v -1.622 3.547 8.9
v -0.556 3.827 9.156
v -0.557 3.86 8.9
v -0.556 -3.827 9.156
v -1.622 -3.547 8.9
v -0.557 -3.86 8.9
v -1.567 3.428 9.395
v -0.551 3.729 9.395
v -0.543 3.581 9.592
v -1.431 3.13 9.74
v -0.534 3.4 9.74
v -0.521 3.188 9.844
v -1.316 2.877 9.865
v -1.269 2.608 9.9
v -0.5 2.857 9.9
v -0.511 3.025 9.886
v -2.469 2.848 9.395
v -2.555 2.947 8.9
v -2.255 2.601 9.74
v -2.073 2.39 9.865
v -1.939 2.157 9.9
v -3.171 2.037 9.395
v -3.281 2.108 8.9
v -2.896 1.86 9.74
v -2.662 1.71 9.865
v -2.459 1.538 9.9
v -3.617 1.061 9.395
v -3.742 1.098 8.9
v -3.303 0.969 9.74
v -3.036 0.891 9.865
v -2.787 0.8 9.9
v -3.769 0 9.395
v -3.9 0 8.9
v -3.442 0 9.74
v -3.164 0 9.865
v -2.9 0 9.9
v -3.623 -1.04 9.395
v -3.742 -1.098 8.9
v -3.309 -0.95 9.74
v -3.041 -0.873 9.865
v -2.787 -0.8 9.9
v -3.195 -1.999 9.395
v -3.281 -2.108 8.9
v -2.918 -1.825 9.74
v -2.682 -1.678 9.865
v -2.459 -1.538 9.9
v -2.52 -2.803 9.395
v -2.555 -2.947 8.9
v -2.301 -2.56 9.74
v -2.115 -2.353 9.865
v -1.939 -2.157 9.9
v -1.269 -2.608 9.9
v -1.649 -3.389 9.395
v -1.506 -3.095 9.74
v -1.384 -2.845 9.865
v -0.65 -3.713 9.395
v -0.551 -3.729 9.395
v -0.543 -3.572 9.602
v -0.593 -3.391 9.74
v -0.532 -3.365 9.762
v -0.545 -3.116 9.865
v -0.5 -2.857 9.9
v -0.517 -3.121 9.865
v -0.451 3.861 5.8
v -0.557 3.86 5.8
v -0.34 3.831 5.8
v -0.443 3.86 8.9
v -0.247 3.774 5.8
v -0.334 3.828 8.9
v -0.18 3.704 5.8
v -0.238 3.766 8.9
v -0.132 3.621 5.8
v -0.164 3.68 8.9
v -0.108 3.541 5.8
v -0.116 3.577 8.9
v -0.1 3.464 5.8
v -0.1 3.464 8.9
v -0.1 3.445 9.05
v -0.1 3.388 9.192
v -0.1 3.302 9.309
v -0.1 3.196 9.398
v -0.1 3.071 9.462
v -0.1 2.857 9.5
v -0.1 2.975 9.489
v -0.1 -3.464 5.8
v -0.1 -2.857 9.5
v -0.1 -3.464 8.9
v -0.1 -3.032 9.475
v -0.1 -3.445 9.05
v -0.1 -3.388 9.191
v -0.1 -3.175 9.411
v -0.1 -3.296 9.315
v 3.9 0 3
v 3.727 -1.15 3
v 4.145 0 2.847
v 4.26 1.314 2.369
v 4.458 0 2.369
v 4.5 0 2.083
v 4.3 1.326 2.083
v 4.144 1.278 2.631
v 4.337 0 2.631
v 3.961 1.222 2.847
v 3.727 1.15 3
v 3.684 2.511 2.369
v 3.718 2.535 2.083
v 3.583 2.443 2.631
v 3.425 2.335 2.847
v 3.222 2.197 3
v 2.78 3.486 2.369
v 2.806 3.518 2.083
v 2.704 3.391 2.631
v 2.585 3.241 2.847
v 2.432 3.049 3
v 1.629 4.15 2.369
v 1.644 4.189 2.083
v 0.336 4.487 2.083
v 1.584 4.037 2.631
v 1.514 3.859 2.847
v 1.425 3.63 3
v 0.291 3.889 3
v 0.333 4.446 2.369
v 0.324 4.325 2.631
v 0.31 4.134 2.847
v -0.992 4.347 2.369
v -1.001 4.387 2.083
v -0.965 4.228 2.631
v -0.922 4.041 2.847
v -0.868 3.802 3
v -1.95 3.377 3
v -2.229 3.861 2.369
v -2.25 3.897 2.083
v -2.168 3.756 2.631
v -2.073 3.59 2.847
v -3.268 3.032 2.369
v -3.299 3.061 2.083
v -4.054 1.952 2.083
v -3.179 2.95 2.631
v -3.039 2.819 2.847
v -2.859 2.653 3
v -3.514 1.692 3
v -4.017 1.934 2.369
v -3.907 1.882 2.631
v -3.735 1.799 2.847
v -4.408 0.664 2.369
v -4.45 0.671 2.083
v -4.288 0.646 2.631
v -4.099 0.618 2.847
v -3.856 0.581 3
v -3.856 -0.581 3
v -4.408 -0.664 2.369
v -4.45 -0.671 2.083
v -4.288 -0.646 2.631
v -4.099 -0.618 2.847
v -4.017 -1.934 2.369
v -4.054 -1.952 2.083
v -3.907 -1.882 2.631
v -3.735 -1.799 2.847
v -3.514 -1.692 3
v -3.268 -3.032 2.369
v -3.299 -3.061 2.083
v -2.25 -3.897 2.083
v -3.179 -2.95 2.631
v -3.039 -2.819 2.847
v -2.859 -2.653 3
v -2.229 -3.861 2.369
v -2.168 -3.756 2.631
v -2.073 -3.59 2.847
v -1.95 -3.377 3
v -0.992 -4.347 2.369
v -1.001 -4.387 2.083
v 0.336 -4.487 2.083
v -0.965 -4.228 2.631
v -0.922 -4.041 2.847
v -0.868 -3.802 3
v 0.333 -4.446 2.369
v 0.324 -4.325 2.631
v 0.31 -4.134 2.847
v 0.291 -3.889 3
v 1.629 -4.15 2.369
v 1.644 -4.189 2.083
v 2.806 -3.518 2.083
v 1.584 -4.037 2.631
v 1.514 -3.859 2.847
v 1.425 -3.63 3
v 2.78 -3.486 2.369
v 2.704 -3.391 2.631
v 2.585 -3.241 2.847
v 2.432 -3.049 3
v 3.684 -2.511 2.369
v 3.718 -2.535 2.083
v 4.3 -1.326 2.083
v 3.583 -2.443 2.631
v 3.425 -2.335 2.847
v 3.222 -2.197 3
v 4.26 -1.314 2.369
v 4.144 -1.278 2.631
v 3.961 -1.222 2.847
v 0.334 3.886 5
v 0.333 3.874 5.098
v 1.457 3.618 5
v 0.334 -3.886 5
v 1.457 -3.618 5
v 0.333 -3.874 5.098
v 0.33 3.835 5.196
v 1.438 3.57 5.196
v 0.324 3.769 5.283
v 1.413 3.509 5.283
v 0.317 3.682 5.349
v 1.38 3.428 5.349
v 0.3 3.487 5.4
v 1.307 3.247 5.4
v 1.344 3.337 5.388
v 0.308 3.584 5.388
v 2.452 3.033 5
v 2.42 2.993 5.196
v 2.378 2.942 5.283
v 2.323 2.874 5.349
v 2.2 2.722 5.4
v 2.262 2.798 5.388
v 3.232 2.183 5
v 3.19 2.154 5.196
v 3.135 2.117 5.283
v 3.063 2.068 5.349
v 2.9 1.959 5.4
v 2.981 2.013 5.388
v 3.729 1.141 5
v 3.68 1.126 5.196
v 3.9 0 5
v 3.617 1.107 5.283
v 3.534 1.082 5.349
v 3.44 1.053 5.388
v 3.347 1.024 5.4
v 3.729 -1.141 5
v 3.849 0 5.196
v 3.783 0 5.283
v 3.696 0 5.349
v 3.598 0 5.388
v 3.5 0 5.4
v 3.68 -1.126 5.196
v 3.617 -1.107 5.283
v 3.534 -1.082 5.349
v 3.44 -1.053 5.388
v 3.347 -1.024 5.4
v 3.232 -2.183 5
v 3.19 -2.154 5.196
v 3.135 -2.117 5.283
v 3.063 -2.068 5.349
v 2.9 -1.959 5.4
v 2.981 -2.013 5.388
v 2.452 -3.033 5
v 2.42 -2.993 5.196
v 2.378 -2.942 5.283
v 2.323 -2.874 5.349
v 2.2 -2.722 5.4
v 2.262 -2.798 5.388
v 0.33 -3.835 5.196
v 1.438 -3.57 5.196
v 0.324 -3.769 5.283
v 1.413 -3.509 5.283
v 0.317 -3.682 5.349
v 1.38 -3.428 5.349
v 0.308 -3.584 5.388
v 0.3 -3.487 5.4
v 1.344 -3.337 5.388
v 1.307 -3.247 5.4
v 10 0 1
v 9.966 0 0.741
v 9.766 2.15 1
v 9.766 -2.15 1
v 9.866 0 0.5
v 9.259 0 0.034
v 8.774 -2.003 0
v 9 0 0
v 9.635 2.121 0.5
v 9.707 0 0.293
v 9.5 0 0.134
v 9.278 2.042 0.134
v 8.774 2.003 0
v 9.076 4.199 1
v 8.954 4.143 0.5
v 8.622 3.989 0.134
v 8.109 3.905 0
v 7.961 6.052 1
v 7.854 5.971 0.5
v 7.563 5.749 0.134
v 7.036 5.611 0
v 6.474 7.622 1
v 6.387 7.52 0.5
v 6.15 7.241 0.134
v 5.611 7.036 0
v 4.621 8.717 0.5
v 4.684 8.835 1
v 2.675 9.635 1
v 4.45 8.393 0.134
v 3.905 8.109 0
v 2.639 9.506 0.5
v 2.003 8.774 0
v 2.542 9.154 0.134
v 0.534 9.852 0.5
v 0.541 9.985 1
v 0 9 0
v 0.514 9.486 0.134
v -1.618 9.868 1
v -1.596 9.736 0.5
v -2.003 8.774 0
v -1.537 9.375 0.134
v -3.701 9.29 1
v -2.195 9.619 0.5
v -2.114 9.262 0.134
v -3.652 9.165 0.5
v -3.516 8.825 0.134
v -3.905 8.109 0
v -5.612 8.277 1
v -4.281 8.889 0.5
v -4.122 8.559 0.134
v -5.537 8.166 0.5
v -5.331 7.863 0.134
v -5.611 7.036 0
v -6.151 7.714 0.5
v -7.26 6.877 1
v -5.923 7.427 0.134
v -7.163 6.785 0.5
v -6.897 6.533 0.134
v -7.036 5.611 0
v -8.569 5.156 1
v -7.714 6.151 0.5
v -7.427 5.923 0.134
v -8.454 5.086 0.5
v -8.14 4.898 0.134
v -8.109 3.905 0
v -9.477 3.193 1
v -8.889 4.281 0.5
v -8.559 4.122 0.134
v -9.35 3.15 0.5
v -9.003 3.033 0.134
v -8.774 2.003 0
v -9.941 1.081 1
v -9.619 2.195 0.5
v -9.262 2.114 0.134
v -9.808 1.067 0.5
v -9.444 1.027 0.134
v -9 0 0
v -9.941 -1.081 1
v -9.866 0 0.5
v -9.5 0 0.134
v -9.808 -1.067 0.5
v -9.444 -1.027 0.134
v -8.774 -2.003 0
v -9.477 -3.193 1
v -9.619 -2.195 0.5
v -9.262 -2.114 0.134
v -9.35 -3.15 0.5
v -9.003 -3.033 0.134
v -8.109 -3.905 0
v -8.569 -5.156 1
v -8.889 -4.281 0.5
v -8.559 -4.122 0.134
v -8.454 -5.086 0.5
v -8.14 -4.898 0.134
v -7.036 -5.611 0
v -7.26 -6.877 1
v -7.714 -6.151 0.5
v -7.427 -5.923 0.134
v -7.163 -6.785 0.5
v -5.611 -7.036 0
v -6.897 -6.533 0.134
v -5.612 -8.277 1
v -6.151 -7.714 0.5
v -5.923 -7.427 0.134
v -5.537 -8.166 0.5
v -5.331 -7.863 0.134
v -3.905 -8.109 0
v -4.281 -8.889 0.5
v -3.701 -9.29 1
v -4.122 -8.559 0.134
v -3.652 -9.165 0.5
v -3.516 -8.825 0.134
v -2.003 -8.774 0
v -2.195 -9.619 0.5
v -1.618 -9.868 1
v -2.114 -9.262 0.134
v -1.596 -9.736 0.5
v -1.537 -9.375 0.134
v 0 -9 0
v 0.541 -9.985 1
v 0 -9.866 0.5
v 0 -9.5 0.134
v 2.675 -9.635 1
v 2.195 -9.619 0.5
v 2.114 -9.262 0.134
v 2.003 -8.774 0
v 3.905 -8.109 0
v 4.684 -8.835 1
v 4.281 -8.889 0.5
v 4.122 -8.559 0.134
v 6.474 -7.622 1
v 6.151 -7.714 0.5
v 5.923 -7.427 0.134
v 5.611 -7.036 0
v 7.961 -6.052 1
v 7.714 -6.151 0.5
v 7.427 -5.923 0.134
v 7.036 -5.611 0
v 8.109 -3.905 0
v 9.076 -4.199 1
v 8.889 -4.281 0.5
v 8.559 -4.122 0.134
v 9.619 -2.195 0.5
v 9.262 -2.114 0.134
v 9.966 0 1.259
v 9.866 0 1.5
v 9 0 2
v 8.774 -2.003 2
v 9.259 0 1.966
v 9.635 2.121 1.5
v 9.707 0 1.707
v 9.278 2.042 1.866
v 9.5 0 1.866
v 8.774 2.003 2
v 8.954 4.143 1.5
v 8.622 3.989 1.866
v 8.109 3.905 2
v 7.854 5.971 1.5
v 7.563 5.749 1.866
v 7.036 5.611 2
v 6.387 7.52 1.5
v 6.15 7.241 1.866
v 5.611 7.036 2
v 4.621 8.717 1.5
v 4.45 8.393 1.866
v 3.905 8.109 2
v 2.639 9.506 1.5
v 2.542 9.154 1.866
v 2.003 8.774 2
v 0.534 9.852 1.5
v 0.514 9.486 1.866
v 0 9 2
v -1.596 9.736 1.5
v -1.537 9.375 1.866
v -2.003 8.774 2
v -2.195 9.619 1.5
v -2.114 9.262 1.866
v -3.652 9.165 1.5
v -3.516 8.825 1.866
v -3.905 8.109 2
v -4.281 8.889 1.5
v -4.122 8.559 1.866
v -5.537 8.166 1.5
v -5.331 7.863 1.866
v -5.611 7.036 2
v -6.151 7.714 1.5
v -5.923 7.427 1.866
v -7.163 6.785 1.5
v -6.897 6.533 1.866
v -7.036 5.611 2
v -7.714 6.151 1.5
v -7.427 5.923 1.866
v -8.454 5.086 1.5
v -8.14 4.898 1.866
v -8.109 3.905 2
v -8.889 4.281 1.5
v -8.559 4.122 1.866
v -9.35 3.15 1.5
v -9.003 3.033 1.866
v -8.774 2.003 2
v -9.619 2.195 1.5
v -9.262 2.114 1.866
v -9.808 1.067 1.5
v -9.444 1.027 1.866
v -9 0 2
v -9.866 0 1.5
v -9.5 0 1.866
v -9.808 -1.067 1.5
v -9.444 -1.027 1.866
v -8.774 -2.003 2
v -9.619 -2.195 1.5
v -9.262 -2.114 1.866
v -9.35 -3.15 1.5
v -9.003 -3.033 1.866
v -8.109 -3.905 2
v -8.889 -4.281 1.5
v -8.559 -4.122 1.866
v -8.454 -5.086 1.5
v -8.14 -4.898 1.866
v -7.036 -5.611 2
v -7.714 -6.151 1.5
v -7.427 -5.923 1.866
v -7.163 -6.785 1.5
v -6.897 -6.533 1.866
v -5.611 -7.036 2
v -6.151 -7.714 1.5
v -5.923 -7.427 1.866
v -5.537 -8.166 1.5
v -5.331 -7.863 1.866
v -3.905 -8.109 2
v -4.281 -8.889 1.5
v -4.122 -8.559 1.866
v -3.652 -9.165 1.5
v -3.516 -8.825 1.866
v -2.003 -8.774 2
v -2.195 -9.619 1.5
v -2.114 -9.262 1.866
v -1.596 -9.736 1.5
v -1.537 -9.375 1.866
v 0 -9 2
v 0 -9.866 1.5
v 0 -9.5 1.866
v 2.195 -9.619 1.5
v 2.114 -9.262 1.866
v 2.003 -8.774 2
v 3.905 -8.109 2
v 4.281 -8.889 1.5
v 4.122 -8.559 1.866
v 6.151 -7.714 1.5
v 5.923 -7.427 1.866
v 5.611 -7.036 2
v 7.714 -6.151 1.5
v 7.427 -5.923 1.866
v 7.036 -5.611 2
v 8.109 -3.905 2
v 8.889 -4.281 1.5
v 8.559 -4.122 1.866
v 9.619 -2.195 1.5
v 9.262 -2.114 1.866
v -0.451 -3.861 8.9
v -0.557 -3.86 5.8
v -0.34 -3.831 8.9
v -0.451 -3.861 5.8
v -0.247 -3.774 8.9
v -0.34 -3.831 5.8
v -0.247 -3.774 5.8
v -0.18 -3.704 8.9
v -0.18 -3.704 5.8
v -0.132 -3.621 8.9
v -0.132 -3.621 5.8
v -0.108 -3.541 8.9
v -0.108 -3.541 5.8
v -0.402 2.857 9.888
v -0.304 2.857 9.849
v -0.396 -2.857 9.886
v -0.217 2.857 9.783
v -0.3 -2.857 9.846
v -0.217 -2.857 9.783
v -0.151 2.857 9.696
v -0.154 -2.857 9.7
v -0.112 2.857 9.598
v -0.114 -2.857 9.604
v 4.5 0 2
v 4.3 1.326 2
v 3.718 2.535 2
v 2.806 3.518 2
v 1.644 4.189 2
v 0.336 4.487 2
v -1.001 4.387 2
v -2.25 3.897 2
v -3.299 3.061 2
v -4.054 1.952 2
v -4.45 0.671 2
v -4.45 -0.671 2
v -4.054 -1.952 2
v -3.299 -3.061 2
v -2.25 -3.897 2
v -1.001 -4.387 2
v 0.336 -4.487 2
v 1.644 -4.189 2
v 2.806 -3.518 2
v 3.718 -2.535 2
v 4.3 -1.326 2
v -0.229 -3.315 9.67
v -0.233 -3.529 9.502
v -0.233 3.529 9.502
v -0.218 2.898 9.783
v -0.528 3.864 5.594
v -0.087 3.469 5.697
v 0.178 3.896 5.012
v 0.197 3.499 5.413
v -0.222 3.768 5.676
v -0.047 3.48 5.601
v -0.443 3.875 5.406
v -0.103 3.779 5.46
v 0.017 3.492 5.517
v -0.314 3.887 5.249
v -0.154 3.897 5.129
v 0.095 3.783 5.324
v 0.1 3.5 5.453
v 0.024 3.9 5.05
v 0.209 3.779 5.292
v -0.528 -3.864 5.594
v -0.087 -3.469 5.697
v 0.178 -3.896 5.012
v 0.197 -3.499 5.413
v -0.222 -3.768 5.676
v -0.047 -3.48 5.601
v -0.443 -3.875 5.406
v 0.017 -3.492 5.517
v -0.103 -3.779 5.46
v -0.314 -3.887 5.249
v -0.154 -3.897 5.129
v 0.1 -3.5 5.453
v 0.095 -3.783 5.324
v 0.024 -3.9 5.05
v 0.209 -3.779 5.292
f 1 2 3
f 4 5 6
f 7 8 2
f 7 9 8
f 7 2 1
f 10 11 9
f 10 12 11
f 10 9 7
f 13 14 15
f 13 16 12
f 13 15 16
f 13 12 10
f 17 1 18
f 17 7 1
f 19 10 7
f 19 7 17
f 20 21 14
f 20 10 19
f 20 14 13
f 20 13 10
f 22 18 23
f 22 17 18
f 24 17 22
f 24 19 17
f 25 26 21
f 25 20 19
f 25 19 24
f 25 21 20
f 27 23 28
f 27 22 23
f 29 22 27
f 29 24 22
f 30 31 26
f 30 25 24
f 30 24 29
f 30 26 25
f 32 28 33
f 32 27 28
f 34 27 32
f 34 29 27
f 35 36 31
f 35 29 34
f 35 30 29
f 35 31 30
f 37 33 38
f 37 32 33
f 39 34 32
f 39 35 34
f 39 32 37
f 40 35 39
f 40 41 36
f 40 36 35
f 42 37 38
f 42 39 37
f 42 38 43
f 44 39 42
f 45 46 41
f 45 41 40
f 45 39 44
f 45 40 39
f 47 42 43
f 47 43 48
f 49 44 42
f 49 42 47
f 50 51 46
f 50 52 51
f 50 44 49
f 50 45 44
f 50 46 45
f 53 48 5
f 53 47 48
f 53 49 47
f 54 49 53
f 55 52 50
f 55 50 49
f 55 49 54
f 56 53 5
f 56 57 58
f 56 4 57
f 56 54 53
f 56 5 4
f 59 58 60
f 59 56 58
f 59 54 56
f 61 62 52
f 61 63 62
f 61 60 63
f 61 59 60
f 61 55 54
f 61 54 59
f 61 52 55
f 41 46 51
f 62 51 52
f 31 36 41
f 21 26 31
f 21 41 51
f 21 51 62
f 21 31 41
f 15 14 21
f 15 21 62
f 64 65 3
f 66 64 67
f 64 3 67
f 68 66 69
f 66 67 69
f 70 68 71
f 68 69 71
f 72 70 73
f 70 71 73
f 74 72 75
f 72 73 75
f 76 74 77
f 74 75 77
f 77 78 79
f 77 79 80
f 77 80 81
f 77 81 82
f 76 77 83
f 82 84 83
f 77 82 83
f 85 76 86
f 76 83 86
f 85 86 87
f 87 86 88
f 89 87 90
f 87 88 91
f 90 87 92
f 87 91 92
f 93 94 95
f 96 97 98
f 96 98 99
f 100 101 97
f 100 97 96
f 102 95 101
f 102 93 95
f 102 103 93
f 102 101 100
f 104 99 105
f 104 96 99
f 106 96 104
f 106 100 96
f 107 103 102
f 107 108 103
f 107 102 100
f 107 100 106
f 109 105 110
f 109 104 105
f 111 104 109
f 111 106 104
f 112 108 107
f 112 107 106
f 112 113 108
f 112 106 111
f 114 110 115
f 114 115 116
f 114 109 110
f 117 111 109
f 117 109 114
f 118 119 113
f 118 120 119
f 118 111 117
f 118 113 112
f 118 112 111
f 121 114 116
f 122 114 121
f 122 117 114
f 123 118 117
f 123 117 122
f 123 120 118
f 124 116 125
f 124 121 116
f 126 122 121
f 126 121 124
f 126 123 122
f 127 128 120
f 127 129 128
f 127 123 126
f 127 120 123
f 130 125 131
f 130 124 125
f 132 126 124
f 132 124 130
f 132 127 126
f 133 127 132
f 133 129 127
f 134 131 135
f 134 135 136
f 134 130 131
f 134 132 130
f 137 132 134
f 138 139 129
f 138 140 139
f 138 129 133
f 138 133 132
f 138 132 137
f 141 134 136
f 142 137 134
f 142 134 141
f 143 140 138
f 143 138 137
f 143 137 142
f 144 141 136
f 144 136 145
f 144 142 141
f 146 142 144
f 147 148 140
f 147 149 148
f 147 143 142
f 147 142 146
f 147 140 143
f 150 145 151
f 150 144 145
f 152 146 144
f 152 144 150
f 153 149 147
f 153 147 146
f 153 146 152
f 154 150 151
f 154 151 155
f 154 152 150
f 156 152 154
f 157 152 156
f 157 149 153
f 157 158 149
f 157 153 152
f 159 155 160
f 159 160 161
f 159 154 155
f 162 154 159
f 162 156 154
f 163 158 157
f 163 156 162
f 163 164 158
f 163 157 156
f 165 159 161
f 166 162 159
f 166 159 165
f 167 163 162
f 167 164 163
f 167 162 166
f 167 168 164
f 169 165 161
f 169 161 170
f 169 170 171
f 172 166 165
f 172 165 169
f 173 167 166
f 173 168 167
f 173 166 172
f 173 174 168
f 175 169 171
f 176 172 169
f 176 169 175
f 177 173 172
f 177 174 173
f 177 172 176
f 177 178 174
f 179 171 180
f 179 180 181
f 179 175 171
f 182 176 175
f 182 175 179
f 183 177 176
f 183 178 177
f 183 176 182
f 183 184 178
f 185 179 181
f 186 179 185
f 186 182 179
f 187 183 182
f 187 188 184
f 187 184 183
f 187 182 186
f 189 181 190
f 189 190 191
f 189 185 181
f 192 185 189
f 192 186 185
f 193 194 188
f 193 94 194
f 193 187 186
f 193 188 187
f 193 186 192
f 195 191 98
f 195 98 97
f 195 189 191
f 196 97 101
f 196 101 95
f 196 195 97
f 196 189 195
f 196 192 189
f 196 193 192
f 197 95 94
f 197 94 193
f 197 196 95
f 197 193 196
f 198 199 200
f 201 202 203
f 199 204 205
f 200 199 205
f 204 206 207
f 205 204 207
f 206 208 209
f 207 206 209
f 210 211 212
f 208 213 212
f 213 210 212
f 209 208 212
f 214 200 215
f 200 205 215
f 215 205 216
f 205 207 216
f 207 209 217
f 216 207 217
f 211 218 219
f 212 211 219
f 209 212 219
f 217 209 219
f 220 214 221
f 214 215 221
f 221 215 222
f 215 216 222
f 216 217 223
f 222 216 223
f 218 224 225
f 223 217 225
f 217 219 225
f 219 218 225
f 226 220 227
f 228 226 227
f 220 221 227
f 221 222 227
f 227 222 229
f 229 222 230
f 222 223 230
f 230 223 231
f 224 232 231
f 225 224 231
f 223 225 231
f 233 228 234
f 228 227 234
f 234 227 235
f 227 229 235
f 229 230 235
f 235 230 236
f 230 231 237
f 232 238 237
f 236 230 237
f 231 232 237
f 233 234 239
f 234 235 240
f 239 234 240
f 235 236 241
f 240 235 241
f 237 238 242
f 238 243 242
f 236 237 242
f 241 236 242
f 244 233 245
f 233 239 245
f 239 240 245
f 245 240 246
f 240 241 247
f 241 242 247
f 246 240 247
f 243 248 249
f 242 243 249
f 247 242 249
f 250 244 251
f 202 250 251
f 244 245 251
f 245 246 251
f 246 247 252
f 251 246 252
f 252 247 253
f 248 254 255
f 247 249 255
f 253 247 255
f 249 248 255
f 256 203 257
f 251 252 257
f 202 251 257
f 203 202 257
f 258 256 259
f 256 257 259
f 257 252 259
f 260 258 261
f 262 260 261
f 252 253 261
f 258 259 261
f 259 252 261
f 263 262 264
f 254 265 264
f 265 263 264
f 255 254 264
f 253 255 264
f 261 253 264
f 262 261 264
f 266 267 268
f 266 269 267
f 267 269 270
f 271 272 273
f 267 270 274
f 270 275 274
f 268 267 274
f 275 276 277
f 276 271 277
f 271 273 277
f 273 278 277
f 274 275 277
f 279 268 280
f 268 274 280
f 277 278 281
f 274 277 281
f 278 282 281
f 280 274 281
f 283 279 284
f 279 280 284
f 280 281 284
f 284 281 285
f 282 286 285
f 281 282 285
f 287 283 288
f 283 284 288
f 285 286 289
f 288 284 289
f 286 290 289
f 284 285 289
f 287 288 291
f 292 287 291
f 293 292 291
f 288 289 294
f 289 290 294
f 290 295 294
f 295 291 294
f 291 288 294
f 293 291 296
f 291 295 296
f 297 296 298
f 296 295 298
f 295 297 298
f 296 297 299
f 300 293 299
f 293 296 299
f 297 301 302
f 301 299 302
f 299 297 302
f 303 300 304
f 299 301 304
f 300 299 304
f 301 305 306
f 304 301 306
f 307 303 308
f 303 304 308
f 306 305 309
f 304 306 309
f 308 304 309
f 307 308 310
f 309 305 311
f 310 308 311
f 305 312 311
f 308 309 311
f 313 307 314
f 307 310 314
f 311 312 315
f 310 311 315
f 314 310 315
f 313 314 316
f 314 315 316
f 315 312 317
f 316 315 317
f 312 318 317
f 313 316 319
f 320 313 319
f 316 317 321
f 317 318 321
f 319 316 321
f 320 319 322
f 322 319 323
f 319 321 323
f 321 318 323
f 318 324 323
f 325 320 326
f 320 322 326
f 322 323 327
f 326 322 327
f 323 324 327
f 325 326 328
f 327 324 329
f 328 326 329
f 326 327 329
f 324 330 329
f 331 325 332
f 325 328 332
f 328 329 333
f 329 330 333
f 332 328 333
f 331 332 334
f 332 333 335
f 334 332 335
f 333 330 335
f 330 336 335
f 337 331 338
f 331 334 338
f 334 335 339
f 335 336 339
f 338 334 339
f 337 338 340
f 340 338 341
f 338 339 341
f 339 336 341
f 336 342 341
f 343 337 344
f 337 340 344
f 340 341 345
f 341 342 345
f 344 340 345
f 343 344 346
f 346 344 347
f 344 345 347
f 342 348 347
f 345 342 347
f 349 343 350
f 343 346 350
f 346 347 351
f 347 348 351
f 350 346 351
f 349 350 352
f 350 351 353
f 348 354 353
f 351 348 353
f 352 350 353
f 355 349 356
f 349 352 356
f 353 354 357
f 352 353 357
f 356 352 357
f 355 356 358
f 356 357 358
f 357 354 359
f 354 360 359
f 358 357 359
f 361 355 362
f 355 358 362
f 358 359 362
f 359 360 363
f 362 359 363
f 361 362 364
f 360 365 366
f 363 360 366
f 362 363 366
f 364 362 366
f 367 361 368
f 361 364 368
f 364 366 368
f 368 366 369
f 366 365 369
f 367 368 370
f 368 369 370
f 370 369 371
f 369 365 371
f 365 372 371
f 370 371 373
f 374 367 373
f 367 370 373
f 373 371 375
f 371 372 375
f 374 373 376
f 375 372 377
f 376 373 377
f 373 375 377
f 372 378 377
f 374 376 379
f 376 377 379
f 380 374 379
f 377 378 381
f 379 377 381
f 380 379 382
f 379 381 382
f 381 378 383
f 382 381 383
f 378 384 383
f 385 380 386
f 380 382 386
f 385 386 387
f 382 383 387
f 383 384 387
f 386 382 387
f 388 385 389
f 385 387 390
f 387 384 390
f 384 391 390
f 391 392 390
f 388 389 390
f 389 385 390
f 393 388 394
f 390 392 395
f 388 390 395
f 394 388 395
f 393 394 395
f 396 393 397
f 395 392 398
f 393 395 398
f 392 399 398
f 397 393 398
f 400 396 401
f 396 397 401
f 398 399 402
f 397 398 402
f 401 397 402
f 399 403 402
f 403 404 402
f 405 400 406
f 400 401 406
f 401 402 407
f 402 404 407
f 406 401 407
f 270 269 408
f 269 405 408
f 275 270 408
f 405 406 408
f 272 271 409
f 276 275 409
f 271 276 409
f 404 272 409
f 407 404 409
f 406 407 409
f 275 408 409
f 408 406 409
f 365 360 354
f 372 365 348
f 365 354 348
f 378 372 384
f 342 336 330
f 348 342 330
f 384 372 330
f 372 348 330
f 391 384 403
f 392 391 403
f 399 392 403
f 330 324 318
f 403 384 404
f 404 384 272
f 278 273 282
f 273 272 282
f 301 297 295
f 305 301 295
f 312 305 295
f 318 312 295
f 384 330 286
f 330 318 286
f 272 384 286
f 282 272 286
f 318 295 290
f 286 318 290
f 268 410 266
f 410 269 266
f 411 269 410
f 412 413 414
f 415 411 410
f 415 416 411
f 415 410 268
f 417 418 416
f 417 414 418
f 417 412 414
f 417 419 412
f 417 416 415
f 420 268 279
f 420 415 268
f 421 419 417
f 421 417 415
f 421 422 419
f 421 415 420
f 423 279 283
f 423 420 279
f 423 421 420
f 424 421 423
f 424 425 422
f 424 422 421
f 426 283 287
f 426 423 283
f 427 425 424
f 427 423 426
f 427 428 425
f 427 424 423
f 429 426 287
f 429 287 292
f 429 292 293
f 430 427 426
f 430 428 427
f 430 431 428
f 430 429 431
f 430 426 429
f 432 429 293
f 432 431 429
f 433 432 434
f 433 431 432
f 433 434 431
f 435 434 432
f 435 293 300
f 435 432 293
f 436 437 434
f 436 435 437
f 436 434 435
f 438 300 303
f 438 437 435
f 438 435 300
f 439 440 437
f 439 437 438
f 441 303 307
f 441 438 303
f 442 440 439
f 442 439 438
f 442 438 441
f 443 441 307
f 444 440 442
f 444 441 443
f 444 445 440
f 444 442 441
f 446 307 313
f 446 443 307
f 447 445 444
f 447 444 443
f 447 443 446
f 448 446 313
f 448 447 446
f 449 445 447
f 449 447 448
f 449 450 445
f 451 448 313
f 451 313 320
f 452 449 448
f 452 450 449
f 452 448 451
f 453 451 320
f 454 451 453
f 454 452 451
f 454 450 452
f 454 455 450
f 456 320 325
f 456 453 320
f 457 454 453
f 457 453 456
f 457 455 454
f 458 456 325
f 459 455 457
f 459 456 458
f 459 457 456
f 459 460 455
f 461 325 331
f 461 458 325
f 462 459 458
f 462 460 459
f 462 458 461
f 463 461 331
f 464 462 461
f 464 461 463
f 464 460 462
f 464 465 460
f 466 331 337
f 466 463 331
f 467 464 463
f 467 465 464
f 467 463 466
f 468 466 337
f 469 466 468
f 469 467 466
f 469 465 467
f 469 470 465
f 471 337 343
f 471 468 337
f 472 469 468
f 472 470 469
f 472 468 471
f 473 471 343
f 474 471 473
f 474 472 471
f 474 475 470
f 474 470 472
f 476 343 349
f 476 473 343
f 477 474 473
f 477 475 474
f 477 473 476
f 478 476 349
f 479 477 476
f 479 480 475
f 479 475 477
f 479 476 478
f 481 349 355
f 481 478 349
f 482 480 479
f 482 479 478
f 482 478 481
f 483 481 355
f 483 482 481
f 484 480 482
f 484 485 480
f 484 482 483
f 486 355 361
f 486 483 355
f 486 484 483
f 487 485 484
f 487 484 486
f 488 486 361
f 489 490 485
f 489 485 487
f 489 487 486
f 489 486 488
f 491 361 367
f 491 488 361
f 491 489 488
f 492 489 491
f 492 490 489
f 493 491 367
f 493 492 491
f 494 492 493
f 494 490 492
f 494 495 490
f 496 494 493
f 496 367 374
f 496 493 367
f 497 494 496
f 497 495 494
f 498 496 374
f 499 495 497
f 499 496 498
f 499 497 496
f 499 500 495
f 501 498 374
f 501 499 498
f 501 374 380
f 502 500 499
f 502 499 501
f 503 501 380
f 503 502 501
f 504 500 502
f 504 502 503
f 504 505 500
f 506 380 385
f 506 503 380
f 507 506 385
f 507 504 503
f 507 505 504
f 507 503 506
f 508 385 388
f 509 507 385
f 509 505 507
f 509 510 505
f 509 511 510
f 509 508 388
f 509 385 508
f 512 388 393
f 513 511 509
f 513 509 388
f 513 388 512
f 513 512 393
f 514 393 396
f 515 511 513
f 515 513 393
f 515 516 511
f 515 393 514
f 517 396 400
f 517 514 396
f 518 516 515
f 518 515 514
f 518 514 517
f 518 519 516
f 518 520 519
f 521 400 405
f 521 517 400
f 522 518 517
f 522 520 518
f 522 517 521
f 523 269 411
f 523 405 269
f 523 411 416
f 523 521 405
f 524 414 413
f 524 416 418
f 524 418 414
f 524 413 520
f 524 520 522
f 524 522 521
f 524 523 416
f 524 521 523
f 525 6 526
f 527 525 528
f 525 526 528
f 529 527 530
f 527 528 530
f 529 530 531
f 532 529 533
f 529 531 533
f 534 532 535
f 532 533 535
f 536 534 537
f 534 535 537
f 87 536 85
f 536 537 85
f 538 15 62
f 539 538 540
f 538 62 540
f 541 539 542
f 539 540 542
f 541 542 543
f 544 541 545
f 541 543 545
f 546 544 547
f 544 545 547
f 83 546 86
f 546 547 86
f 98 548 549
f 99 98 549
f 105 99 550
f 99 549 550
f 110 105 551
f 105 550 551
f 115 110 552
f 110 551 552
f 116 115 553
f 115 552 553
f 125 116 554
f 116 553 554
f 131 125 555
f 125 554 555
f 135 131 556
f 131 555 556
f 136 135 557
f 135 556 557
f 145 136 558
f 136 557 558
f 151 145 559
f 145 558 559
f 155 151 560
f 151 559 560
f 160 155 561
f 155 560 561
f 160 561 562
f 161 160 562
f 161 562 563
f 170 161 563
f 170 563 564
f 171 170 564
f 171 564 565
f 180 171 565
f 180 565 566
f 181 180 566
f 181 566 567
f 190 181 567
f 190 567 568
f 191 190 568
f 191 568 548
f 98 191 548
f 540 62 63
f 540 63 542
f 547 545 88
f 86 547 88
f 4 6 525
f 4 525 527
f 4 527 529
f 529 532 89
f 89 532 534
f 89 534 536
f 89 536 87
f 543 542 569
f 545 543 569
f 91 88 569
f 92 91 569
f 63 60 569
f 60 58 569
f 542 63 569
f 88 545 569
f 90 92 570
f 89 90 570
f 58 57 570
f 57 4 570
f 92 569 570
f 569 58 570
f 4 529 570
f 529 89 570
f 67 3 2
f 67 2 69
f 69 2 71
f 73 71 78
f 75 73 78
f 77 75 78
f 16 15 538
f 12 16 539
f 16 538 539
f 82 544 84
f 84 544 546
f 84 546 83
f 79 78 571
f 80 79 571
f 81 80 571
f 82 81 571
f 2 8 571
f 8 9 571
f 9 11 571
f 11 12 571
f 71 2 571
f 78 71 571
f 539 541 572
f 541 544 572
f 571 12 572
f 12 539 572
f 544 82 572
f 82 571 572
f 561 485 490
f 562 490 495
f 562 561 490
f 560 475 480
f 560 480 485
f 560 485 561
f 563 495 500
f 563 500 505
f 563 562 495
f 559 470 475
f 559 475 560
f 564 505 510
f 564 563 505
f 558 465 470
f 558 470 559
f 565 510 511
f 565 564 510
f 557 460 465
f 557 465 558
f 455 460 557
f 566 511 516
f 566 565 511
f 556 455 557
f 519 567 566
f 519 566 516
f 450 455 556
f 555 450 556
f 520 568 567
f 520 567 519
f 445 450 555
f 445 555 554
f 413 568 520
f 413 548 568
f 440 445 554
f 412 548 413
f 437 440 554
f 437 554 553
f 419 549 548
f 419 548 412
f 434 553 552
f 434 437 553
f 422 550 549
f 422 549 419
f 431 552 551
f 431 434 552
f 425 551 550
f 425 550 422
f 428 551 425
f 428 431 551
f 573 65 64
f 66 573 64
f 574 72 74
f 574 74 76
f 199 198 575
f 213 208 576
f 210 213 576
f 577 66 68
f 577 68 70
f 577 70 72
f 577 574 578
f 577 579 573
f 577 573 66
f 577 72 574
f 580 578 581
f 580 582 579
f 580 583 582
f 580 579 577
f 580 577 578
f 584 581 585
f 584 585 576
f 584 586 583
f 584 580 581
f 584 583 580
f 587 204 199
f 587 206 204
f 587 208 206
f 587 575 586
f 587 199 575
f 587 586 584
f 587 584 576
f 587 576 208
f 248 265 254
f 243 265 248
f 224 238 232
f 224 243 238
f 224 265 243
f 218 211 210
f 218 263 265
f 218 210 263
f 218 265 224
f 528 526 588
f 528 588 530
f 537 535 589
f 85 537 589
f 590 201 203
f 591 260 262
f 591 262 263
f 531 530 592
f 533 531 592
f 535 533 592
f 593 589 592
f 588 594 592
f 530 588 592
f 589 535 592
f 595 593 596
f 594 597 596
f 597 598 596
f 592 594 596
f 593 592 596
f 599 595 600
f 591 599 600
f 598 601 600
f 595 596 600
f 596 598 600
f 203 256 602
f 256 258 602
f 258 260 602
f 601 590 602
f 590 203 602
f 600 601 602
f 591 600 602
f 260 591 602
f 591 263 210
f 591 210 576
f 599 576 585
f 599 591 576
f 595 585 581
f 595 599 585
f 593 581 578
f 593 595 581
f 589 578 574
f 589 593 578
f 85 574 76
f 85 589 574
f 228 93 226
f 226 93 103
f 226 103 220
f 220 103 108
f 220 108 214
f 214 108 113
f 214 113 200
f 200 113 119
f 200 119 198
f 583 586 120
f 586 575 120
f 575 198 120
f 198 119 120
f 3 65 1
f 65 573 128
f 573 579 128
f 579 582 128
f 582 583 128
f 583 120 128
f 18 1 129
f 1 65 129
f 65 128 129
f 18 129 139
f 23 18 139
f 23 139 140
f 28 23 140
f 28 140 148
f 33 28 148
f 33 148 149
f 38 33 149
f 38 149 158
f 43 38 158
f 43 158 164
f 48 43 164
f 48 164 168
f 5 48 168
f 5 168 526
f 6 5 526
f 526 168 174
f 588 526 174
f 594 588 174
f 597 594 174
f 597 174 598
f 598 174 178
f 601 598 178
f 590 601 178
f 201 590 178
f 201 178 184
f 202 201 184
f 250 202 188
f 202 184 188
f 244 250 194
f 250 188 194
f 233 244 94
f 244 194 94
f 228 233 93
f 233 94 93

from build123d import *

# Parameters (mm, degrees)
F0_R        = 10
F1_DEPTH    = 2
F2_R        = 4.5
F3_DEPTH    = 1
F4_R        = 3.9
F5_DEPTH    = 6.9
F8_DEPTH    = 5.5
F9_T8_ANGLE = 250.6318620022
F10_R       = 0.4


# Not quite as in the source:
# - a fillet or chamfer that OpenCascade refuses, or shapes differently, is made with other operations: its cross-section is extruded or revolved along the edge and cut away or added


with BuildPart() as f1:
    # F0 (on Top) → F1 (new body)
    with BuildSketch(Plane.XY):
        Circle(F0_R)
    extrude(amount=F1_DEPTH)

    # F2 (on face) → F3 (join)
    with BuildSketch(Plane.XY.offset(2)):
        Circle(F2_R)
    extrude(amount=F3_DEPTH)

    # F4 (on face) → F5 (join)
    with BuildSketch(Plane.XY.offset(3)):
        Circle(F4_R)
    extrude(amount=F5_DEPTH)

    # F7 (on offset) → F8 (cut, symmetric)
    with BuildSketch(Plane.XY.offset(10.9)):
        Polygon((5.1383636892, 5.7038869709), (-0.1, 5.7038869709), (-0.1, -5.6052659638), (5.1383636892, -5.3080837242), align=None)
    extrude(amount=F8_DEPTH, both=True, mode=Mode.SUBTRACT)

    # F9: fillet of radius 1 on 4 edges, made by hand

    # F9_s1 → F9_t2 (revolve, cut)
    with BuildSketch(Plane.XZ):
        with BuildLine():
            ThreePointArc((10, 1), (9.7071067812, 0.2928932188), (9, 0))
            Line((9, 0), (10, 0))
            Line((10, 0), (10, 1))
        make_face()
    revolve(axis=Axis((0, 0, 0), (0, 0, 1)), mode=Mode.SUBTRACT)

    # F9_s3 → F9_t4 (revolve, cut)
    with BuildSketch(Plane.XZ):
        with BuildLine():
            ThreePointArc((10, 1), (9.7071067812, 1.7071067812), (9, 2))
            Line((9, 2), (10, 2))
            Line((10, 2), (10, 1))
        make_face()
    revolve(axis=Axis((0, 0, 2), (0, 0, 1)), mode=Mode.SUBTRACT)

    # F9_s5 → F9_t6 (revolve, cut)
    with BuildSketch(Plane.XZ):
        with BuildLine():
            ThreePointArc((4.5, 2.083484861), (4.3366600265, 2.6312074185), (3.9, 3))
            Line((3.9, 3), (4.5, 3))
            Line((4.5, 3), (4.5, 2.083484861))
        make_face()
    revolve(axis=Axis((0, 0, 3), (0, 0, 1)), mode=Mode.SUBTRACT)

    # F9_s7 → F9_t8 (revolve, cut)
    with BuildSketch(Plane(origin=(0, 0, 0), x_dir=(0, 0, 1), z_dir=(0.8159768861, -0.5780845278, 0))):
        with BuildLine():
            ThreePointArc((8.9, -3.9), (9.6071067812, -3.6071067812), (9.9, -2.9))
            Line((9.9, -2.9), (9.9, -3.9))
            Line((9.9, -3.9), (8.9, -3.9))
        make_face()
    revolve(axis=Axis((0, 0, 9.9), (0, 0, 1)), revolution_arc=F9_T8_ANGLE, mode=Mode.SUBTRACT)

    # F10
    f10_edges = [f1.edges().sort_by_distance(p)[0] for p in [
        (-0.1, -3.898718, 7.15),
        (-0.1, 3.898718, 7.15),
        (-0.1, 3.605629, 9.607198),
        (-0.1, -3.605629, 9.607198),
        (-0.1, 0, 9.9),
        (2.722132, -2.792848, 5.4),
        (2.722132, 2.792848, 5.4),
        (-0.1, 0, 5.4),
    ]]
    fillet(f10_edges, radius=F10_R)


solid = f1.part
